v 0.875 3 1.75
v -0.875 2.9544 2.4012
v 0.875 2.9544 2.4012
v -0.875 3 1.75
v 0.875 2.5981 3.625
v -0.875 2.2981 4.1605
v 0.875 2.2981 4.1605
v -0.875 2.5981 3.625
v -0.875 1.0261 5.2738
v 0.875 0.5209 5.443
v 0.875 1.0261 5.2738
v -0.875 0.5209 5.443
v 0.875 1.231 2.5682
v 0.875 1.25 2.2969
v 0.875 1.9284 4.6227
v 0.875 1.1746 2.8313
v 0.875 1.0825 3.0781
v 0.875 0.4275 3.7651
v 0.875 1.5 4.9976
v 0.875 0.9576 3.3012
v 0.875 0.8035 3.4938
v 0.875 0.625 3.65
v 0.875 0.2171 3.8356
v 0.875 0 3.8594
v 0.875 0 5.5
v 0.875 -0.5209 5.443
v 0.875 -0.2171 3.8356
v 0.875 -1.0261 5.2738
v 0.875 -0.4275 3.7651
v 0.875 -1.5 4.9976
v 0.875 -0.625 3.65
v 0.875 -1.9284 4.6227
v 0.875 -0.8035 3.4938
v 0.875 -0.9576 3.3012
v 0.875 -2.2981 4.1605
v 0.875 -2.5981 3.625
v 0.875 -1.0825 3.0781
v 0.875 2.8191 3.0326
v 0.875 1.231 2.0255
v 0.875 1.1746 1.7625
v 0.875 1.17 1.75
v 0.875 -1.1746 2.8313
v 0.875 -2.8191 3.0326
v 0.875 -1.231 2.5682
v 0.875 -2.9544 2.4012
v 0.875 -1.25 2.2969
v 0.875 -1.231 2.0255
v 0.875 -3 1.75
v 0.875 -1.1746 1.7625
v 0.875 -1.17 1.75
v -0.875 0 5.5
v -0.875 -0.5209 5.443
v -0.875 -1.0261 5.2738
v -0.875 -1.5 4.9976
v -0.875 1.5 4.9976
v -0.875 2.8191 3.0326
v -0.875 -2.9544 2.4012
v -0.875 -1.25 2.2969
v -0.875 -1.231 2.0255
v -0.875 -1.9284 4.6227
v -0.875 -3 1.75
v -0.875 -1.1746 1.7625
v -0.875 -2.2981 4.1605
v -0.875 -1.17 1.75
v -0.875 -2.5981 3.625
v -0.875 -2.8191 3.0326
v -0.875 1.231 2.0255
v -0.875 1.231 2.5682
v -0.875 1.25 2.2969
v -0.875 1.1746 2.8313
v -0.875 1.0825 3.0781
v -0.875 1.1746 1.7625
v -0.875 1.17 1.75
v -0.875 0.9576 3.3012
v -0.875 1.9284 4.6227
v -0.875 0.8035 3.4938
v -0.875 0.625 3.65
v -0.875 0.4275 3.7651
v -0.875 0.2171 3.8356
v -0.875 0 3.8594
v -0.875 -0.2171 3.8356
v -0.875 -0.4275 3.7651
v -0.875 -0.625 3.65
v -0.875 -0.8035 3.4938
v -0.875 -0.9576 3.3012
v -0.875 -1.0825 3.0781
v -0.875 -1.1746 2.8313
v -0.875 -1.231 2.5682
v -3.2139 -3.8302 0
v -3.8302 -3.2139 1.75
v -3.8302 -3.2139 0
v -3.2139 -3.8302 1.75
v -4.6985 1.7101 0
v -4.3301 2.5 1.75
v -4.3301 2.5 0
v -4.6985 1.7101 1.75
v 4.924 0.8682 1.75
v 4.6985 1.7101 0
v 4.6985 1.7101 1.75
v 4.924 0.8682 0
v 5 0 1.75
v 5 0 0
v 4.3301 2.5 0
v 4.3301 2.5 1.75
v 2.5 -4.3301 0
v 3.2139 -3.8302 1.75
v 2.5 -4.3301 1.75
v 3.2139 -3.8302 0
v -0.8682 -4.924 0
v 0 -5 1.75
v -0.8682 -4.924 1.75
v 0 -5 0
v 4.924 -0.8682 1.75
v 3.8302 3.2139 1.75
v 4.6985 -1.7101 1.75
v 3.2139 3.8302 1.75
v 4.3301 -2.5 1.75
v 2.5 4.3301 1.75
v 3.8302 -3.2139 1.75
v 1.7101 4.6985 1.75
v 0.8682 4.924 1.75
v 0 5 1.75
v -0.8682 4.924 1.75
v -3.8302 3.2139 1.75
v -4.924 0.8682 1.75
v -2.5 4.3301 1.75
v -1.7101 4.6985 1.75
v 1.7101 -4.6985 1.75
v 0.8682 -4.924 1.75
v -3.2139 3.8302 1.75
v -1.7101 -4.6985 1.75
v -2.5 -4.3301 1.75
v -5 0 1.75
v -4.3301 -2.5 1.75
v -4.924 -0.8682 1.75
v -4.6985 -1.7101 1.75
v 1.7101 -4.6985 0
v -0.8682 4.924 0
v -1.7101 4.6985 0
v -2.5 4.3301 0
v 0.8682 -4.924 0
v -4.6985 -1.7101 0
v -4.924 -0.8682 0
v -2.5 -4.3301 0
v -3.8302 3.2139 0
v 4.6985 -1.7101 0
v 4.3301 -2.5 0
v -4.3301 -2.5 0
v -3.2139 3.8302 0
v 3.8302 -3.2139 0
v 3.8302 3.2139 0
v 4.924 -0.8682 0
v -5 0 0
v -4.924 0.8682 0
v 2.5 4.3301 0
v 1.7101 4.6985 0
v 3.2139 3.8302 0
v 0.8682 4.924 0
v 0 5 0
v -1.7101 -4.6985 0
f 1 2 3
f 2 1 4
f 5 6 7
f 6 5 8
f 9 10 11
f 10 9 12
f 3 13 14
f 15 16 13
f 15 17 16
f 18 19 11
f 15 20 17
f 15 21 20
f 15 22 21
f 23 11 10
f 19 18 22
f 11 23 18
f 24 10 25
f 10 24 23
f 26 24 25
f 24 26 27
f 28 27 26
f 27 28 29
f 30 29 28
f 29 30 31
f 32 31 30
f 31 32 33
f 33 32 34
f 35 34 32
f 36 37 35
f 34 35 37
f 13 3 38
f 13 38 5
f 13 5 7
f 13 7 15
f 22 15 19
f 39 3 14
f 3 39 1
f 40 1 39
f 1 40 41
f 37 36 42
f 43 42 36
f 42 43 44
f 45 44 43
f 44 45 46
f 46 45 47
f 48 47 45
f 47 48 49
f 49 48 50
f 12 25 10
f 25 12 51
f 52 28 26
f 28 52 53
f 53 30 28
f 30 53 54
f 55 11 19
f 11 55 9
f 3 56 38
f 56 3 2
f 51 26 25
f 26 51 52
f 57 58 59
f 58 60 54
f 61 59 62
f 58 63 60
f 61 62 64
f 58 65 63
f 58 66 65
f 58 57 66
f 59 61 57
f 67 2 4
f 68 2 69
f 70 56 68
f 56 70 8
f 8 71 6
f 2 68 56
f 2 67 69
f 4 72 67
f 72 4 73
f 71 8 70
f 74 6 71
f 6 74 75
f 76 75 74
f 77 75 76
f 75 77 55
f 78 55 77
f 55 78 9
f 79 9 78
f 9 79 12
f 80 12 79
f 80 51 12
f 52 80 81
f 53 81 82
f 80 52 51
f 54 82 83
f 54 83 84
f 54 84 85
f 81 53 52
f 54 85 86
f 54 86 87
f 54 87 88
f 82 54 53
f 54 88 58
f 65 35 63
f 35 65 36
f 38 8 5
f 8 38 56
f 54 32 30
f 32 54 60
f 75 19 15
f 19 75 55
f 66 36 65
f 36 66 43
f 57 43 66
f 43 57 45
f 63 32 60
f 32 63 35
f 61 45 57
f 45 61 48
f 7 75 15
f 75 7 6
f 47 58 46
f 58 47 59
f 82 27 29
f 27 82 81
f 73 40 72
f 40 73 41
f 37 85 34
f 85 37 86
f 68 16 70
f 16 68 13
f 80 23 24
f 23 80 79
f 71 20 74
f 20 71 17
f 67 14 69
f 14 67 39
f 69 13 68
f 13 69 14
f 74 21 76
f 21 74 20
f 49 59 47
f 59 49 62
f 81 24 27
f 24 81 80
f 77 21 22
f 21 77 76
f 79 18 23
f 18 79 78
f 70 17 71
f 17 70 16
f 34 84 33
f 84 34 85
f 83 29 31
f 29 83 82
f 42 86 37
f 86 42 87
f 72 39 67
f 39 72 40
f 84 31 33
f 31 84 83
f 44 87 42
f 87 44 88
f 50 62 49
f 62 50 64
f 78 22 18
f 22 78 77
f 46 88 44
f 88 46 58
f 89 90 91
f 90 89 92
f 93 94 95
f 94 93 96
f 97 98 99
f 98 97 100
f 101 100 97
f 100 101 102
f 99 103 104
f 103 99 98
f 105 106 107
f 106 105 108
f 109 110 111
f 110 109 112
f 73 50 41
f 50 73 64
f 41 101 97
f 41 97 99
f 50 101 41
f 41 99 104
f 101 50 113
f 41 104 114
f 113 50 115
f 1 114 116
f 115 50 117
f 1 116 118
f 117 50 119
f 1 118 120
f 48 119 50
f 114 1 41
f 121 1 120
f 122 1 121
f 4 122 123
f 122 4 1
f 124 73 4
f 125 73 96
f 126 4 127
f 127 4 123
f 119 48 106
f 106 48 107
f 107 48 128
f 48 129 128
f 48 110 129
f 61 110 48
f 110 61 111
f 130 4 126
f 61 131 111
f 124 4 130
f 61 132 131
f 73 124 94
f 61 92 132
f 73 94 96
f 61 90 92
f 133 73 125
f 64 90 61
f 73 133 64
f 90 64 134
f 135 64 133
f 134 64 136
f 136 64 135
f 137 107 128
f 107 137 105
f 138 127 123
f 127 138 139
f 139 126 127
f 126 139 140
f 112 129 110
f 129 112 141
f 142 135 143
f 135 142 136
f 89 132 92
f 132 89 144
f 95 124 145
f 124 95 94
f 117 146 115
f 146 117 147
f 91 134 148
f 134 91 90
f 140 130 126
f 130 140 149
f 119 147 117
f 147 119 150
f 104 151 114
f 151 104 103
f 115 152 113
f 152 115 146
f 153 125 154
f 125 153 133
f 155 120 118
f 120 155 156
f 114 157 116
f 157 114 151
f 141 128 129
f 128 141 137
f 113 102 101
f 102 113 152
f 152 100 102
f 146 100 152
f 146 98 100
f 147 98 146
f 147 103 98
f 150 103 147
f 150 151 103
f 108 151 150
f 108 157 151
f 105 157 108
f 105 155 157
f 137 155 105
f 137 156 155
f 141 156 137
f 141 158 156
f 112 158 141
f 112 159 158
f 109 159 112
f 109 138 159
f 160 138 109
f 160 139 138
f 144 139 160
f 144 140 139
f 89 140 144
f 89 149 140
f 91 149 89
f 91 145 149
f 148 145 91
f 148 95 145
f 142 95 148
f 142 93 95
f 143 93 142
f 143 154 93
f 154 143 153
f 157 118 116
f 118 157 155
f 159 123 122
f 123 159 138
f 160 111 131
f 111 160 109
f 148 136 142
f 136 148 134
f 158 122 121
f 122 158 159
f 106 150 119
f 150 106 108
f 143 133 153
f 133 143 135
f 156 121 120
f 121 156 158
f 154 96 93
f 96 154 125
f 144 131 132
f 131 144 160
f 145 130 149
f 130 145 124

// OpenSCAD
bottom_height = 1.75; // 7
diameter = 10; // 12
blobSize = 0; // 4;
holeWall = 1.75; // 4.5;
holeSize = 1.25;

$fn = 36;
intersection() {
    union() {
        cylinder(d=diameter,h=bottom_height);
        render(convexity=2)
        for (i=[0:36:360]) rotate([0,0,i]) translate([diameter/2,0,0]) cylinder(d=blobSize,h=bottom_height);
            
        render(convexity=2)
        translate([0,0,bottom_height])
        scale([1,1,1.25])
        rotate([0,90,0])
        translate([0,0,-holeWall/2])
        difference() {
            linear_extrude(height=holeWall) circle(d=holeSize*2+holeWall*2);
            translate([-0.25*holeWall,0,-50]) cylinder(d=holeSize*2,h=100);
        }
    }
    cylinder(d=100,h=100);
}
